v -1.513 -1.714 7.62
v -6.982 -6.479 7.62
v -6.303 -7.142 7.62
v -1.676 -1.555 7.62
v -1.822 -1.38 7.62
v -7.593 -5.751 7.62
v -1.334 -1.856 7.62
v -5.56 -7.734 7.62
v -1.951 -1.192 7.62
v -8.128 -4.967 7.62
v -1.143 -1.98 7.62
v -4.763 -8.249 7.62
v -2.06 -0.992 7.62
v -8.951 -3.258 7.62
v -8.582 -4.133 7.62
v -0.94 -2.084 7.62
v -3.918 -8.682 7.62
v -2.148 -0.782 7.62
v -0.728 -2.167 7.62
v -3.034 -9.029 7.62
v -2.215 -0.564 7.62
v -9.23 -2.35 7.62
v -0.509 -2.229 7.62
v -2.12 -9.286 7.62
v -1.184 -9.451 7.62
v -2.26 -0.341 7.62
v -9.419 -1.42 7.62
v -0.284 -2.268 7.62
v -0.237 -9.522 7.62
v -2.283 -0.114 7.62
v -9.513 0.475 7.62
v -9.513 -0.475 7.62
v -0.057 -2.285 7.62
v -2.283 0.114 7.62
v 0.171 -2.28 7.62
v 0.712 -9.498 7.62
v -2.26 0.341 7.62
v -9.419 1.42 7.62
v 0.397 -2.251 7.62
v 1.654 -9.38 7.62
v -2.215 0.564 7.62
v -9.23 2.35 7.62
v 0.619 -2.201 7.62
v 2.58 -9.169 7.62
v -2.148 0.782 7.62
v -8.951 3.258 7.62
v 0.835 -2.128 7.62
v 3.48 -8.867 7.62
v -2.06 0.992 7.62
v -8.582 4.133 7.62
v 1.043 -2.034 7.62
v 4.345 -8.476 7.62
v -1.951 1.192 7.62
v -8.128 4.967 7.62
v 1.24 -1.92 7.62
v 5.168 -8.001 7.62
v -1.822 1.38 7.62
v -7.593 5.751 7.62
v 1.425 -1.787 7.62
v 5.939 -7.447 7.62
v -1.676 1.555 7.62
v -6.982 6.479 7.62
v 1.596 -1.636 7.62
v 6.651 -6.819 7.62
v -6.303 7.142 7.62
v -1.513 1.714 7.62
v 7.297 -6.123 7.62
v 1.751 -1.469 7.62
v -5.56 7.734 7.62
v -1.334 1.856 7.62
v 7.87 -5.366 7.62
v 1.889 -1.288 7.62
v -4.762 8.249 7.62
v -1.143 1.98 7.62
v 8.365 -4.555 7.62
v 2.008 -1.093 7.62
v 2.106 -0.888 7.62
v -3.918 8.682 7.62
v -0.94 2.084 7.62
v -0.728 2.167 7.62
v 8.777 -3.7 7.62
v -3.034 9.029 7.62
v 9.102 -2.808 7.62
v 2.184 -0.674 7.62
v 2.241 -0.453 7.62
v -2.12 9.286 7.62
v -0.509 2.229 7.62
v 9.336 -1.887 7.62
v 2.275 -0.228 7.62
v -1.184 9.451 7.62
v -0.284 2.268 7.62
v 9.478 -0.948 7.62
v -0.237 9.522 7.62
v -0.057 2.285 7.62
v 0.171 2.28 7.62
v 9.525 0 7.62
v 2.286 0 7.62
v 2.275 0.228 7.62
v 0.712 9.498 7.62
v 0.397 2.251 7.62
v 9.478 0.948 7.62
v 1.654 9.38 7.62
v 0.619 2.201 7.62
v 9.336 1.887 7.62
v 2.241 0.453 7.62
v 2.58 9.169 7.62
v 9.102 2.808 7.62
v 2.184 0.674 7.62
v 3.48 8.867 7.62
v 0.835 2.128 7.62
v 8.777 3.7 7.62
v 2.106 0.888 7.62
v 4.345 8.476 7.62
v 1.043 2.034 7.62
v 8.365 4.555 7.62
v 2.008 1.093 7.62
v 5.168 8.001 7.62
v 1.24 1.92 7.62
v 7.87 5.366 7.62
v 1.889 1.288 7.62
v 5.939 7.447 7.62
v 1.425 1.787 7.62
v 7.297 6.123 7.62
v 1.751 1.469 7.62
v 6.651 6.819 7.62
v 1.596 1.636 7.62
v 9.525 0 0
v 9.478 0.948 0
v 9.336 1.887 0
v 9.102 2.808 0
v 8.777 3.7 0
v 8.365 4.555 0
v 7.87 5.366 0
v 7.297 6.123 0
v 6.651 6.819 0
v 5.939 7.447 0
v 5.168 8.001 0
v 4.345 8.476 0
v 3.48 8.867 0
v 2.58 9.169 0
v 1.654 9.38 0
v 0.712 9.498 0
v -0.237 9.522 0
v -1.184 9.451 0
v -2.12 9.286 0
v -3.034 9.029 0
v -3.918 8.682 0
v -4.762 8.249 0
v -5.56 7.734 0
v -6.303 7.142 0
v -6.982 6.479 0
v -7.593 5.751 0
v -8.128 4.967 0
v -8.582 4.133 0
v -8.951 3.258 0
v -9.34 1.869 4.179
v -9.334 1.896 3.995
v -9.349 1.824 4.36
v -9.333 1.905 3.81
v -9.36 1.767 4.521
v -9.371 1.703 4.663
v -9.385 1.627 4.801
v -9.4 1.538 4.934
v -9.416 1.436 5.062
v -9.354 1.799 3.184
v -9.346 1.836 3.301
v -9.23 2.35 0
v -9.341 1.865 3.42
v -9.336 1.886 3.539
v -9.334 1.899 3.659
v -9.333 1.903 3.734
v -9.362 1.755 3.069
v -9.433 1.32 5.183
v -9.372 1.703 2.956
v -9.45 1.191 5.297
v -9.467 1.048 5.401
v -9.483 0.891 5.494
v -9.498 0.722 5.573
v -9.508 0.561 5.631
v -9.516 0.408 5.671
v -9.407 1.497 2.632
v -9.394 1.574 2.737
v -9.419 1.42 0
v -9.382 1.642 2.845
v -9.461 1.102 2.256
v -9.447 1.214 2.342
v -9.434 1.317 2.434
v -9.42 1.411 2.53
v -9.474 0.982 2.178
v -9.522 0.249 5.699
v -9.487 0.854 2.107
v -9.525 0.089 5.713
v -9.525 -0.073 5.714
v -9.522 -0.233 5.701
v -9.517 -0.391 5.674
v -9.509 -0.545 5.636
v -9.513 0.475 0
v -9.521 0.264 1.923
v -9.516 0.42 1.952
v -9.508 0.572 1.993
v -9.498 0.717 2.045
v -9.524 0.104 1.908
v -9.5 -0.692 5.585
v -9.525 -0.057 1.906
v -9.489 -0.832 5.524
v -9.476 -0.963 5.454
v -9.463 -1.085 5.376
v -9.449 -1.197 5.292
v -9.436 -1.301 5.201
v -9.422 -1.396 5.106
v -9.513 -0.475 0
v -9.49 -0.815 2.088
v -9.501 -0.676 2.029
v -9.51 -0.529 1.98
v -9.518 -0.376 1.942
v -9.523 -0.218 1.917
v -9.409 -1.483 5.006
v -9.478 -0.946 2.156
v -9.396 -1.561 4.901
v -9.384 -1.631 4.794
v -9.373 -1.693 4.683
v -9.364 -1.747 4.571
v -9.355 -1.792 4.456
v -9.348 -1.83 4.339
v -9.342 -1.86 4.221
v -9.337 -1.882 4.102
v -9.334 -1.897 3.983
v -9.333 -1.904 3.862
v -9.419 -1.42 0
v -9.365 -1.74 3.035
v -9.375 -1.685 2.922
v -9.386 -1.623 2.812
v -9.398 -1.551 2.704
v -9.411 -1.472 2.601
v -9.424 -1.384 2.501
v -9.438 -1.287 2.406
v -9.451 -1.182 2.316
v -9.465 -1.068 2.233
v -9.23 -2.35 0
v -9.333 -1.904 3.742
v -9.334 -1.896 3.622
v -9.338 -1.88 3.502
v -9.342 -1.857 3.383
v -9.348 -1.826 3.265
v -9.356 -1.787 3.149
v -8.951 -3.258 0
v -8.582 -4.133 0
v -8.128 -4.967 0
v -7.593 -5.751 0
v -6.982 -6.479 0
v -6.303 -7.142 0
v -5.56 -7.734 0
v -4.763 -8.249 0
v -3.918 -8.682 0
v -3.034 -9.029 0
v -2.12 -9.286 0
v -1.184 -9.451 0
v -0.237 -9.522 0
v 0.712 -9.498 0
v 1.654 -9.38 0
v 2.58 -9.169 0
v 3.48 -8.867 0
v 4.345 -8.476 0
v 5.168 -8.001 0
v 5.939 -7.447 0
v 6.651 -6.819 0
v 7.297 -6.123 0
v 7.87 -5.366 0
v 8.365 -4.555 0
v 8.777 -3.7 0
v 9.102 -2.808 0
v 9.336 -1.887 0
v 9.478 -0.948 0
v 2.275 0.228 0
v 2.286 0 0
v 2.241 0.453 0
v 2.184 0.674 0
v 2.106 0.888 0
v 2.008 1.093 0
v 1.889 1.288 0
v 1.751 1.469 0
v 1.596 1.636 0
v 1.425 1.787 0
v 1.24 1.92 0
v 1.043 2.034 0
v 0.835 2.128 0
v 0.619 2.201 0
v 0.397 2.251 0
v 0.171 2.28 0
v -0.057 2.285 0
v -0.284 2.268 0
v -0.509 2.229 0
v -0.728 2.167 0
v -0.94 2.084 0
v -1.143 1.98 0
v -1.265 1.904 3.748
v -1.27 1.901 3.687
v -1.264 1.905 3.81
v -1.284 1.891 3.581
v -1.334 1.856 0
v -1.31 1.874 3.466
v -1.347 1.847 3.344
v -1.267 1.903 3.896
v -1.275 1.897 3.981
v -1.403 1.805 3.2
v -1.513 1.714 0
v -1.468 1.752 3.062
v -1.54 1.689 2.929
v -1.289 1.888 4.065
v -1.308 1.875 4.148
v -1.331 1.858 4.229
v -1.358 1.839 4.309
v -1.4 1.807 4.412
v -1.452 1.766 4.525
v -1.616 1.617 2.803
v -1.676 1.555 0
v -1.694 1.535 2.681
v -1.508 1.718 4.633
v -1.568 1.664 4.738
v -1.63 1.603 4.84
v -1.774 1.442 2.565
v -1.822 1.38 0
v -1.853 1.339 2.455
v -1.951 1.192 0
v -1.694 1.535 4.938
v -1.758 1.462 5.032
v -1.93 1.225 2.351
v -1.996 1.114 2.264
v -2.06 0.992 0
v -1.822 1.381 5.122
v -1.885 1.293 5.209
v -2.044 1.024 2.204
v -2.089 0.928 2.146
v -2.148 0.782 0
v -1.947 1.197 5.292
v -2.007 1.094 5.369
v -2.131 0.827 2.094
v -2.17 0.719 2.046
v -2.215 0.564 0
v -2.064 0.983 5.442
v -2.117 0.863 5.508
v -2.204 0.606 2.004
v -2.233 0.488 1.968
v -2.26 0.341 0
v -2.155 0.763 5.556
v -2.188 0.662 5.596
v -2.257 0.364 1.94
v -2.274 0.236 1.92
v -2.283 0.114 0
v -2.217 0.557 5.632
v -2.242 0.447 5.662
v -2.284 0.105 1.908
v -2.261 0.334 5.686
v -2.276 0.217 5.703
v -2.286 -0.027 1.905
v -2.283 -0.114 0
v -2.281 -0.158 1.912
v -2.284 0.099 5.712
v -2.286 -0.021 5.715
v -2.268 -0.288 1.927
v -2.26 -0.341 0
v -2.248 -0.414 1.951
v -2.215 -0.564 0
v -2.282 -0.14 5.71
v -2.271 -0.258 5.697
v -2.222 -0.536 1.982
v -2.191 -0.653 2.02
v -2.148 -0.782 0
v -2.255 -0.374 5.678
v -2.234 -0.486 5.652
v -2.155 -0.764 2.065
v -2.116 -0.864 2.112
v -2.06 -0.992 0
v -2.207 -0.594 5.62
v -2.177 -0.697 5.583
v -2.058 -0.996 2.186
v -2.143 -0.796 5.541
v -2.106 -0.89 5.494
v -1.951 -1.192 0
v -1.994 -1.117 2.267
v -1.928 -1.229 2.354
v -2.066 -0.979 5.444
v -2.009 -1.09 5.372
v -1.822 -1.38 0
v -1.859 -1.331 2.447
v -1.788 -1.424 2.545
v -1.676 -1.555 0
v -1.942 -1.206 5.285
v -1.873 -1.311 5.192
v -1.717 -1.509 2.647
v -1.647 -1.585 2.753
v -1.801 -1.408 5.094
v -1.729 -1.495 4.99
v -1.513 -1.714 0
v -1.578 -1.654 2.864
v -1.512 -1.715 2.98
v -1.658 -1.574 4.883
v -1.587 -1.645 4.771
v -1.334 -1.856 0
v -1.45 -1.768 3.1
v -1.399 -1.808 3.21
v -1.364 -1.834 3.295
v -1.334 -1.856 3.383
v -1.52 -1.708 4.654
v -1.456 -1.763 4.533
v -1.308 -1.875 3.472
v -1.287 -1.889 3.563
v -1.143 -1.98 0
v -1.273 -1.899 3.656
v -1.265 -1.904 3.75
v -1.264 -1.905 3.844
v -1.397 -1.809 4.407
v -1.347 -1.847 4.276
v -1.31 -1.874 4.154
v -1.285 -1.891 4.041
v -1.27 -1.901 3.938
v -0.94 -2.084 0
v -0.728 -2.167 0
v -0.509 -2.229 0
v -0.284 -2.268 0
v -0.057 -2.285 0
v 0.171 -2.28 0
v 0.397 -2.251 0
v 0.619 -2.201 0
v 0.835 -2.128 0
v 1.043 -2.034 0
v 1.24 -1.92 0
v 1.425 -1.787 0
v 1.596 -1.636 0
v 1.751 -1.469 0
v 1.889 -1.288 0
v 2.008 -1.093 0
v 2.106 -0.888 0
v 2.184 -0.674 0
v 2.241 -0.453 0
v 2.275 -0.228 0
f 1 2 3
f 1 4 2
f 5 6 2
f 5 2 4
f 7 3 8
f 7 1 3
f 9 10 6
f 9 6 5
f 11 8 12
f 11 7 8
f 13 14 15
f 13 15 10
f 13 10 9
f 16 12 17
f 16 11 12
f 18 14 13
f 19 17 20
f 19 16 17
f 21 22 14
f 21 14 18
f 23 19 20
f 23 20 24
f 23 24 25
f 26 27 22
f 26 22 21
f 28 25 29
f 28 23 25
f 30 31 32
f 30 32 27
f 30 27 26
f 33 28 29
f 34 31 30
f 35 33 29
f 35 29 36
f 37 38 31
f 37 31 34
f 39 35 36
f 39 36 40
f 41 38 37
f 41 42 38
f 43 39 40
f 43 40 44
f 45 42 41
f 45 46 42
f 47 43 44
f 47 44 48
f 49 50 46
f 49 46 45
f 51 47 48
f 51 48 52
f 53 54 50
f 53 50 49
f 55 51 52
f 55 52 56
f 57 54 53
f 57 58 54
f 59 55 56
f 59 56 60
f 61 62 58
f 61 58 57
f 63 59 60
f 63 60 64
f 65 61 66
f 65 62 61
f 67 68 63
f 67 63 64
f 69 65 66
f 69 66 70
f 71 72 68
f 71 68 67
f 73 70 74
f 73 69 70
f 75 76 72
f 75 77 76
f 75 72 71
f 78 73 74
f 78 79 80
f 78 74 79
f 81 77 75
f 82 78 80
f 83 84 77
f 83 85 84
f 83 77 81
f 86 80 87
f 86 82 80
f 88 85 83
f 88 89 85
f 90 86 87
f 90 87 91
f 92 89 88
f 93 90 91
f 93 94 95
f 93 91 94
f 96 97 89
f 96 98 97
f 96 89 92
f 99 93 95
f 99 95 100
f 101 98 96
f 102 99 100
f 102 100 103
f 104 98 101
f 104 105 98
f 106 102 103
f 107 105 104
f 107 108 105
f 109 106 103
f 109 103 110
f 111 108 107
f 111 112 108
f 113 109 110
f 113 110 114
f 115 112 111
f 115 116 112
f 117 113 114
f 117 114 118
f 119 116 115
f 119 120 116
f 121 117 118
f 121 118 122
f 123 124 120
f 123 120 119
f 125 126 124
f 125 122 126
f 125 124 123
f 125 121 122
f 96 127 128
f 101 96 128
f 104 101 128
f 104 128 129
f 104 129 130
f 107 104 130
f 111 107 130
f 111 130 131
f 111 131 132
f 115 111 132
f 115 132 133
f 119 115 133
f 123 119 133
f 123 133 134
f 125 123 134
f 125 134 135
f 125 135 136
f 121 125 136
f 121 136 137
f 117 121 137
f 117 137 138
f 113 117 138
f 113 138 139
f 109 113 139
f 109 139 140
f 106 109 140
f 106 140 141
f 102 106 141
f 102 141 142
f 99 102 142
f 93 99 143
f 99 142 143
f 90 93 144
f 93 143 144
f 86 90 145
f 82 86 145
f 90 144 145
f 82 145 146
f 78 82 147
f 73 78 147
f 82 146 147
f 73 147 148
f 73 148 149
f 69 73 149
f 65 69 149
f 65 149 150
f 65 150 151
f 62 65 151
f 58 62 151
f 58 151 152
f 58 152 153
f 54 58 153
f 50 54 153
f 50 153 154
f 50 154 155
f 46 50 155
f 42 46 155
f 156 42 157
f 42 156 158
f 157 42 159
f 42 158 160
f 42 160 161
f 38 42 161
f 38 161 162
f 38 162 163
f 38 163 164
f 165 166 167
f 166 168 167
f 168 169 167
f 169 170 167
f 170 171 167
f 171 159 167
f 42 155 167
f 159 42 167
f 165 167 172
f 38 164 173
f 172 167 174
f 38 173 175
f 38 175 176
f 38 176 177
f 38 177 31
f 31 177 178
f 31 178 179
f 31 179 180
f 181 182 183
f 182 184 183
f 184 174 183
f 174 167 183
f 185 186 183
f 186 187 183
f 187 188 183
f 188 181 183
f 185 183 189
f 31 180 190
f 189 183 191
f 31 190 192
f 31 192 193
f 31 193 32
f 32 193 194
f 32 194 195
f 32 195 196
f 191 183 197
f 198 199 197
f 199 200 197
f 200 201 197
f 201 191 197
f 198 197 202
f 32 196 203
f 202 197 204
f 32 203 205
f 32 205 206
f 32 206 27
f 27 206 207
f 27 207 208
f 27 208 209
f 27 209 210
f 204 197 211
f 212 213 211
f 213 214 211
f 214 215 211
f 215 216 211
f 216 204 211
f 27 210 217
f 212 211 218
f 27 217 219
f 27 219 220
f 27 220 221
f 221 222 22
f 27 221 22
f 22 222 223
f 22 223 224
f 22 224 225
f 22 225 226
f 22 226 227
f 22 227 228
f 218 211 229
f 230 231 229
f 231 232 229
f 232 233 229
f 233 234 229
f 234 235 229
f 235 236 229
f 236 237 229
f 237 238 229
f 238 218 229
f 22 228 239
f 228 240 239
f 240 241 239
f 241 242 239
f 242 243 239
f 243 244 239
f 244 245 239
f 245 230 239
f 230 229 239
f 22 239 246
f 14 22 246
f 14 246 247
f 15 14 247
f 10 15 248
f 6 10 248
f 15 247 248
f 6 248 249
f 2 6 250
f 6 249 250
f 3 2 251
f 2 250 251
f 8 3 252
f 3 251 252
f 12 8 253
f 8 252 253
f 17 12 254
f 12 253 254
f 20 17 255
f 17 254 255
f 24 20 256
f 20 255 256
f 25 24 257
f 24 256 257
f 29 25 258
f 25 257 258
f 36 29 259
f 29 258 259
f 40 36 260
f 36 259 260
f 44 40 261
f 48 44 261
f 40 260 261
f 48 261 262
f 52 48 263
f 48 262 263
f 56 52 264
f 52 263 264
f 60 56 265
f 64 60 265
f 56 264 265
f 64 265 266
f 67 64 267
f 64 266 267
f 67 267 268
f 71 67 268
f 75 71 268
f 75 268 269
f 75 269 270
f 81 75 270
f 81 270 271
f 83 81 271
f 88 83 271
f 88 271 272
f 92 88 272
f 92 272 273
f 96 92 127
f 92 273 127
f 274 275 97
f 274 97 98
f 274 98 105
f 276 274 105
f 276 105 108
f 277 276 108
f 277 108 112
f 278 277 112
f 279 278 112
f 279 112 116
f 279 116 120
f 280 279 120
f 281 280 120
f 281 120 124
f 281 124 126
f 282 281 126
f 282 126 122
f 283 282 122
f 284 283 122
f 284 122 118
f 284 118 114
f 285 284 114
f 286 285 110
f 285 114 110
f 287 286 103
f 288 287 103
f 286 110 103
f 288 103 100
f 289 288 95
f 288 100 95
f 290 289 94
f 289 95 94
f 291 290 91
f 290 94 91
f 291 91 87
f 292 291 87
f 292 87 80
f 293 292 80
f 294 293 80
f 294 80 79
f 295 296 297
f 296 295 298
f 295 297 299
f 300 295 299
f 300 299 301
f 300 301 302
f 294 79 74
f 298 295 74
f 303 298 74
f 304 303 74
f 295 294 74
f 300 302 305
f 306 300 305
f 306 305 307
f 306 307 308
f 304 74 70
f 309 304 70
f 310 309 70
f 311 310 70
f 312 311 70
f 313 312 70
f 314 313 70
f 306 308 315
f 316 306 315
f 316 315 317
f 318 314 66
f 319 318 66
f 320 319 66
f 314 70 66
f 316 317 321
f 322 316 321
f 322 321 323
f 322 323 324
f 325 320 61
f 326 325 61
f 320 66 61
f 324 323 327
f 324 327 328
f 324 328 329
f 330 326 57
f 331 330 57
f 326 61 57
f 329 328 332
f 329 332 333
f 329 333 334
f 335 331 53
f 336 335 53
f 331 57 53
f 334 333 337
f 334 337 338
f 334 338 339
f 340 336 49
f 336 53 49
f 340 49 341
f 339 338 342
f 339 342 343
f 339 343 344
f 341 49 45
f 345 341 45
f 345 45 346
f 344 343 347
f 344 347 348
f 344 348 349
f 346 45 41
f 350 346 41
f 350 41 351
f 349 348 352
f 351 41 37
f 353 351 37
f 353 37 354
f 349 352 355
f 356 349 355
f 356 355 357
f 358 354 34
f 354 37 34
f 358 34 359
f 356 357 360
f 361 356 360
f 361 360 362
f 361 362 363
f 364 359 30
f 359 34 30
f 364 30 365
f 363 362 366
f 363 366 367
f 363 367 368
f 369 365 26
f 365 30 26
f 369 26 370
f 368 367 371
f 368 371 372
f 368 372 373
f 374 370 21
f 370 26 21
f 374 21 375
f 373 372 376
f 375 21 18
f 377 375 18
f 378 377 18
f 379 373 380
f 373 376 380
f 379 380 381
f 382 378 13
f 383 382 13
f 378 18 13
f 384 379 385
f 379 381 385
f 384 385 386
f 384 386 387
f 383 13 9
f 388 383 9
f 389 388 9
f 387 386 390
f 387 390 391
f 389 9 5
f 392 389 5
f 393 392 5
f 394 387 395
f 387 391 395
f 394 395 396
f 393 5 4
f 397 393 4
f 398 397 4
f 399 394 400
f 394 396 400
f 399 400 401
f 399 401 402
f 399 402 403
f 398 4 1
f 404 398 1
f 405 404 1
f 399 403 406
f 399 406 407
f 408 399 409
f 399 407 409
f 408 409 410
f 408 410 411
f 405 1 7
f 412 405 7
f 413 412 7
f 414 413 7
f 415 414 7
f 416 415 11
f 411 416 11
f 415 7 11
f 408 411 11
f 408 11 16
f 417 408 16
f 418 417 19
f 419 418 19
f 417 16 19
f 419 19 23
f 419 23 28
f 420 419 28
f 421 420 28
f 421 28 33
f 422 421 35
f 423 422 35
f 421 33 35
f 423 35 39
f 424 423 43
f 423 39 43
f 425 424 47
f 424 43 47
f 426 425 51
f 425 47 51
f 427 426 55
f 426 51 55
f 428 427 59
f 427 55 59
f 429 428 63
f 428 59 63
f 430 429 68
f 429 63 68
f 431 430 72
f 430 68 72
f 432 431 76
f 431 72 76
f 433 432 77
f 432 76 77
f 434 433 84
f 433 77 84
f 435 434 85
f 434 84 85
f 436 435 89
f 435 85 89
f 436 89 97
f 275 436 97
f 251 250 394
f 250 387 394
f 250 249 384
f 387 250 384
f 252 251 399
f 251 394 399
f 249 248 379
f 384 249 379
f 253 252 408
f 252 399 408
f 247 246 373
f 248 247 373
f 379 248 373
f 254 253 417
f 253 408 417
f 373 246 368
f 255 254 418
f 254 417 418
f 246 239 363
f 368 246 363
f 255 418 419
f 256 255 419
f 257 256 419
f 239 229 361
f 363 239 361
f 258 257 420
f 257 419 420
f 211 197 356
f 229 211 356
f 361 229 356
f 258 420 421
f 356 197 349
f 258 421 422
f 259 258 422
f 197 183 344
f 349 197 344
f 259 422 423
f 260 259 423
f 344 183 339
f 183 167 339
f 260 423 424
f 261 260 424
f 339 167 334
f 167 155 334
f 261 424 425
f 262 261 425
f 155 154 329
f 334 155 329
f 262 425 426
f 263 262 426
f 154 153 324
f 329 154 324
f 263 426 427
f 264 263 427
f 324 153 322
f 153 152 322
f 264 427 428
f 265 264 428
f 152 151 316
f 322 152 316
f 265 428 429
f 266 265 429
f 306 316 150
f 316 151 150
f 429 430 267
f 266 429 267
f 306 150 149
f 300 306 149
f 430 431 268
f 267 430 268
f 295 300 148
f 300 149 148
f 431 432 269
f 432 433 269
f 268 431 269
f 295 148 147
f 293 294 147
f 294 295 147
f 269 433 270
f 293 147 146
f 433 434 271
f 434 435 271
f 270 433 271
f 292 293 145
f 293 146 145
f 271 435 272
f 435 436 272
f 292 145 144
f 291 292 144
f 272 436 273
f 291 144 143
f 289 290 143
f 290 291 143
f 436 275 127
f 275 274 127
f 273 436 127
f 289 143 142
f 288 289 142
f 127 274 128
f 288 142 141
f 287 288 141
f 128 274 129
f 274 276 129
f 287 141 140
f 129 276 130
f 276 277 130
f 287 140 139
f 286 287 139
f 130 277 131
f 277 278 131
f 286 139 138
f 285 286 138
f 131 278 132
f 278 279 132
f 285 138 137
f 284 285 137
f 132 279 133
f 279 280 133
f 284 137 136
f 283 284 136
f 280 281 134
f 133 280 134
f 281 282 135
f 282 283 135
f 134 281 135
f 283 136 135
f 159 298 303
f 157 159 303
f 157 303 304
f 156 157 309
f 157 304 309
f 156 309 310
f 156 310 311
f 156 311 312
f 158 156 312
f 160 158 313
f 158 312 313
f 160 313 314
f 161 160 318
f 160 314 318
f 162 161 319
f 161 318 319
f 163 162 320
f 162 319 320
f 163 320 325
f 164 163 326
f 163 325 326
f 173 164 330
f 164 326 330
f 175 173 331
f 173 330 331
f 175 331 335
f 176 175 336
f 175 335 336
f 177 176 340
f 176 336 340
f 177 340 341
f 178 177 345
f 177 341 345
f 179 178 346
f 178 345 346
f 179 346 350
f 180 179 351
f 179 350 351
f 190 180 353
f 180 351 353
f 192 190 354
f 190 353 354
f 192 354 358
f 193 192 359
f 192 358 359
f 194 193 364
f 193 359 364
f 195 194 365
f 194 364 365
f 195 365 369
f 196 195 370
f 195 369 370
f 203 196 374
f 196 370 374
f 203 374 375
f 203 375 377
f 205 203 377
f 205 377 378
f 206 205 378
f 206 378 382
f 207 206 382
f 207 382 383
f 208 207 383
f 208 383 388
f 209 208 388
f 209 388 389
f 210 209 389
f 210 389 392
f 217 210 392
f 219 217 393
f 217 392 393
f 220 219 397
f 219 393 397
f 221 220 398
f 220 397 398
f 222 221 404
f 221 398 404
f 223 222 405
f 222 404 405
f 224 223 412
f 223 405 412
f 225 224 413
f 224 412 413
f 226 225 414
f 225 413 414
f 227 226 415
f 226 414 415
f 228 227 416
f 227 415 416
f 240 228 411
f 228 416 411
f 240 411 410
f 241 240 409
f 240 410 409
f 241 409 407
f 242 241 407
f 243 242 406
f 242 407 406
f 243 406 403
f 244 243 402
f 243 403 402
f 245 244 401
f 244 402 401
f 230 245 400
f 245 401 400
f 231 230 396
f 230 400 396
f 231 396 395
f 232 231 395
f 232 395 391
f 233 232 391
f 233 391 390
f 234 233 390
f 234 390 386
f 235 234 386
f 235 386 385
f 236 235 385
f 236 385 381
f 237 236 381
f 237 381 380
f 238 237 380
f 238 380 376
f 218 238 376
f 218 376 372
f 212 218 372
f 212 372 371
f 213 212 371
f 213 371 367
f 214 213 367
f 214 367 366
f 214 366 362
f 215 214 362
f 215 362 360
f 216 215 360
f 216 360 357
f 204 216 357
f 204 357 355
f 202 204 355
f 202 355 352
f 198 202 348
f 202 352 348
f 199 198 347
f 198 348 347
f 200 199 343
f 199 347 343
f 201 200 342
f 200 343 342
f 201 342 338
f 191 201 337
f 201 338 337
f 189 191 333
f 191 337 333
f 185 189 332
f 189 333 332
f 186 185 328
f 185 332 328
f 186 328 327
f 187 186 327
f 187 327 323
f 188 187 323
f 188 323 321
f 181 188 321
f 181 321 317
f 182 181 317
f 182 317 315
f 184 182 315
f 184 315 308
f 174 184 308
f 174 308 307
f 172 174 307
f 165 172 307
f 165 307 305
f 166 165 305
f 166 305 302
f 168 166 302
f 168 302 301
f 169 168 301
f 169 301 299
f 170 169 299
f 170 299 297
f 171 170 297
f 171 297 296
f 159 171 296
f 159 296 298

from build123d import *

# Parameters (mm, degrees)
F0_R     = 9.525
F1_DEPTH = 7.62
F2_R     = 2.286
F3_DEPTH = 25.4
F4_R     = 1.905
F5_DEPTH = 25.4


with BuildPart() as f1:
    # F0 (on Top) → F1 (new body)
    with BuildSketch(Plane.XY):
        Circle(F0_R)
    extrude(amount=F1_DEPTH)

    # F2 (on face) → F3 (cut)
    with BuildSketch(Plane.XY.offset(7.62)):
        Circle(F2_R)
    extrude(amount=-F3_DEPTH, mode=Mode.SUBTRACT)

    # F4 (on Right) → F5 (cut)
    with BuildSketch(Plane.YZ):
        with Locations((0, 3.81)):
            Circle(F4_R)
    extrude(amount=-F5_DEPTH, mode=Mode.SUBTRACT)


solid = f1.part
